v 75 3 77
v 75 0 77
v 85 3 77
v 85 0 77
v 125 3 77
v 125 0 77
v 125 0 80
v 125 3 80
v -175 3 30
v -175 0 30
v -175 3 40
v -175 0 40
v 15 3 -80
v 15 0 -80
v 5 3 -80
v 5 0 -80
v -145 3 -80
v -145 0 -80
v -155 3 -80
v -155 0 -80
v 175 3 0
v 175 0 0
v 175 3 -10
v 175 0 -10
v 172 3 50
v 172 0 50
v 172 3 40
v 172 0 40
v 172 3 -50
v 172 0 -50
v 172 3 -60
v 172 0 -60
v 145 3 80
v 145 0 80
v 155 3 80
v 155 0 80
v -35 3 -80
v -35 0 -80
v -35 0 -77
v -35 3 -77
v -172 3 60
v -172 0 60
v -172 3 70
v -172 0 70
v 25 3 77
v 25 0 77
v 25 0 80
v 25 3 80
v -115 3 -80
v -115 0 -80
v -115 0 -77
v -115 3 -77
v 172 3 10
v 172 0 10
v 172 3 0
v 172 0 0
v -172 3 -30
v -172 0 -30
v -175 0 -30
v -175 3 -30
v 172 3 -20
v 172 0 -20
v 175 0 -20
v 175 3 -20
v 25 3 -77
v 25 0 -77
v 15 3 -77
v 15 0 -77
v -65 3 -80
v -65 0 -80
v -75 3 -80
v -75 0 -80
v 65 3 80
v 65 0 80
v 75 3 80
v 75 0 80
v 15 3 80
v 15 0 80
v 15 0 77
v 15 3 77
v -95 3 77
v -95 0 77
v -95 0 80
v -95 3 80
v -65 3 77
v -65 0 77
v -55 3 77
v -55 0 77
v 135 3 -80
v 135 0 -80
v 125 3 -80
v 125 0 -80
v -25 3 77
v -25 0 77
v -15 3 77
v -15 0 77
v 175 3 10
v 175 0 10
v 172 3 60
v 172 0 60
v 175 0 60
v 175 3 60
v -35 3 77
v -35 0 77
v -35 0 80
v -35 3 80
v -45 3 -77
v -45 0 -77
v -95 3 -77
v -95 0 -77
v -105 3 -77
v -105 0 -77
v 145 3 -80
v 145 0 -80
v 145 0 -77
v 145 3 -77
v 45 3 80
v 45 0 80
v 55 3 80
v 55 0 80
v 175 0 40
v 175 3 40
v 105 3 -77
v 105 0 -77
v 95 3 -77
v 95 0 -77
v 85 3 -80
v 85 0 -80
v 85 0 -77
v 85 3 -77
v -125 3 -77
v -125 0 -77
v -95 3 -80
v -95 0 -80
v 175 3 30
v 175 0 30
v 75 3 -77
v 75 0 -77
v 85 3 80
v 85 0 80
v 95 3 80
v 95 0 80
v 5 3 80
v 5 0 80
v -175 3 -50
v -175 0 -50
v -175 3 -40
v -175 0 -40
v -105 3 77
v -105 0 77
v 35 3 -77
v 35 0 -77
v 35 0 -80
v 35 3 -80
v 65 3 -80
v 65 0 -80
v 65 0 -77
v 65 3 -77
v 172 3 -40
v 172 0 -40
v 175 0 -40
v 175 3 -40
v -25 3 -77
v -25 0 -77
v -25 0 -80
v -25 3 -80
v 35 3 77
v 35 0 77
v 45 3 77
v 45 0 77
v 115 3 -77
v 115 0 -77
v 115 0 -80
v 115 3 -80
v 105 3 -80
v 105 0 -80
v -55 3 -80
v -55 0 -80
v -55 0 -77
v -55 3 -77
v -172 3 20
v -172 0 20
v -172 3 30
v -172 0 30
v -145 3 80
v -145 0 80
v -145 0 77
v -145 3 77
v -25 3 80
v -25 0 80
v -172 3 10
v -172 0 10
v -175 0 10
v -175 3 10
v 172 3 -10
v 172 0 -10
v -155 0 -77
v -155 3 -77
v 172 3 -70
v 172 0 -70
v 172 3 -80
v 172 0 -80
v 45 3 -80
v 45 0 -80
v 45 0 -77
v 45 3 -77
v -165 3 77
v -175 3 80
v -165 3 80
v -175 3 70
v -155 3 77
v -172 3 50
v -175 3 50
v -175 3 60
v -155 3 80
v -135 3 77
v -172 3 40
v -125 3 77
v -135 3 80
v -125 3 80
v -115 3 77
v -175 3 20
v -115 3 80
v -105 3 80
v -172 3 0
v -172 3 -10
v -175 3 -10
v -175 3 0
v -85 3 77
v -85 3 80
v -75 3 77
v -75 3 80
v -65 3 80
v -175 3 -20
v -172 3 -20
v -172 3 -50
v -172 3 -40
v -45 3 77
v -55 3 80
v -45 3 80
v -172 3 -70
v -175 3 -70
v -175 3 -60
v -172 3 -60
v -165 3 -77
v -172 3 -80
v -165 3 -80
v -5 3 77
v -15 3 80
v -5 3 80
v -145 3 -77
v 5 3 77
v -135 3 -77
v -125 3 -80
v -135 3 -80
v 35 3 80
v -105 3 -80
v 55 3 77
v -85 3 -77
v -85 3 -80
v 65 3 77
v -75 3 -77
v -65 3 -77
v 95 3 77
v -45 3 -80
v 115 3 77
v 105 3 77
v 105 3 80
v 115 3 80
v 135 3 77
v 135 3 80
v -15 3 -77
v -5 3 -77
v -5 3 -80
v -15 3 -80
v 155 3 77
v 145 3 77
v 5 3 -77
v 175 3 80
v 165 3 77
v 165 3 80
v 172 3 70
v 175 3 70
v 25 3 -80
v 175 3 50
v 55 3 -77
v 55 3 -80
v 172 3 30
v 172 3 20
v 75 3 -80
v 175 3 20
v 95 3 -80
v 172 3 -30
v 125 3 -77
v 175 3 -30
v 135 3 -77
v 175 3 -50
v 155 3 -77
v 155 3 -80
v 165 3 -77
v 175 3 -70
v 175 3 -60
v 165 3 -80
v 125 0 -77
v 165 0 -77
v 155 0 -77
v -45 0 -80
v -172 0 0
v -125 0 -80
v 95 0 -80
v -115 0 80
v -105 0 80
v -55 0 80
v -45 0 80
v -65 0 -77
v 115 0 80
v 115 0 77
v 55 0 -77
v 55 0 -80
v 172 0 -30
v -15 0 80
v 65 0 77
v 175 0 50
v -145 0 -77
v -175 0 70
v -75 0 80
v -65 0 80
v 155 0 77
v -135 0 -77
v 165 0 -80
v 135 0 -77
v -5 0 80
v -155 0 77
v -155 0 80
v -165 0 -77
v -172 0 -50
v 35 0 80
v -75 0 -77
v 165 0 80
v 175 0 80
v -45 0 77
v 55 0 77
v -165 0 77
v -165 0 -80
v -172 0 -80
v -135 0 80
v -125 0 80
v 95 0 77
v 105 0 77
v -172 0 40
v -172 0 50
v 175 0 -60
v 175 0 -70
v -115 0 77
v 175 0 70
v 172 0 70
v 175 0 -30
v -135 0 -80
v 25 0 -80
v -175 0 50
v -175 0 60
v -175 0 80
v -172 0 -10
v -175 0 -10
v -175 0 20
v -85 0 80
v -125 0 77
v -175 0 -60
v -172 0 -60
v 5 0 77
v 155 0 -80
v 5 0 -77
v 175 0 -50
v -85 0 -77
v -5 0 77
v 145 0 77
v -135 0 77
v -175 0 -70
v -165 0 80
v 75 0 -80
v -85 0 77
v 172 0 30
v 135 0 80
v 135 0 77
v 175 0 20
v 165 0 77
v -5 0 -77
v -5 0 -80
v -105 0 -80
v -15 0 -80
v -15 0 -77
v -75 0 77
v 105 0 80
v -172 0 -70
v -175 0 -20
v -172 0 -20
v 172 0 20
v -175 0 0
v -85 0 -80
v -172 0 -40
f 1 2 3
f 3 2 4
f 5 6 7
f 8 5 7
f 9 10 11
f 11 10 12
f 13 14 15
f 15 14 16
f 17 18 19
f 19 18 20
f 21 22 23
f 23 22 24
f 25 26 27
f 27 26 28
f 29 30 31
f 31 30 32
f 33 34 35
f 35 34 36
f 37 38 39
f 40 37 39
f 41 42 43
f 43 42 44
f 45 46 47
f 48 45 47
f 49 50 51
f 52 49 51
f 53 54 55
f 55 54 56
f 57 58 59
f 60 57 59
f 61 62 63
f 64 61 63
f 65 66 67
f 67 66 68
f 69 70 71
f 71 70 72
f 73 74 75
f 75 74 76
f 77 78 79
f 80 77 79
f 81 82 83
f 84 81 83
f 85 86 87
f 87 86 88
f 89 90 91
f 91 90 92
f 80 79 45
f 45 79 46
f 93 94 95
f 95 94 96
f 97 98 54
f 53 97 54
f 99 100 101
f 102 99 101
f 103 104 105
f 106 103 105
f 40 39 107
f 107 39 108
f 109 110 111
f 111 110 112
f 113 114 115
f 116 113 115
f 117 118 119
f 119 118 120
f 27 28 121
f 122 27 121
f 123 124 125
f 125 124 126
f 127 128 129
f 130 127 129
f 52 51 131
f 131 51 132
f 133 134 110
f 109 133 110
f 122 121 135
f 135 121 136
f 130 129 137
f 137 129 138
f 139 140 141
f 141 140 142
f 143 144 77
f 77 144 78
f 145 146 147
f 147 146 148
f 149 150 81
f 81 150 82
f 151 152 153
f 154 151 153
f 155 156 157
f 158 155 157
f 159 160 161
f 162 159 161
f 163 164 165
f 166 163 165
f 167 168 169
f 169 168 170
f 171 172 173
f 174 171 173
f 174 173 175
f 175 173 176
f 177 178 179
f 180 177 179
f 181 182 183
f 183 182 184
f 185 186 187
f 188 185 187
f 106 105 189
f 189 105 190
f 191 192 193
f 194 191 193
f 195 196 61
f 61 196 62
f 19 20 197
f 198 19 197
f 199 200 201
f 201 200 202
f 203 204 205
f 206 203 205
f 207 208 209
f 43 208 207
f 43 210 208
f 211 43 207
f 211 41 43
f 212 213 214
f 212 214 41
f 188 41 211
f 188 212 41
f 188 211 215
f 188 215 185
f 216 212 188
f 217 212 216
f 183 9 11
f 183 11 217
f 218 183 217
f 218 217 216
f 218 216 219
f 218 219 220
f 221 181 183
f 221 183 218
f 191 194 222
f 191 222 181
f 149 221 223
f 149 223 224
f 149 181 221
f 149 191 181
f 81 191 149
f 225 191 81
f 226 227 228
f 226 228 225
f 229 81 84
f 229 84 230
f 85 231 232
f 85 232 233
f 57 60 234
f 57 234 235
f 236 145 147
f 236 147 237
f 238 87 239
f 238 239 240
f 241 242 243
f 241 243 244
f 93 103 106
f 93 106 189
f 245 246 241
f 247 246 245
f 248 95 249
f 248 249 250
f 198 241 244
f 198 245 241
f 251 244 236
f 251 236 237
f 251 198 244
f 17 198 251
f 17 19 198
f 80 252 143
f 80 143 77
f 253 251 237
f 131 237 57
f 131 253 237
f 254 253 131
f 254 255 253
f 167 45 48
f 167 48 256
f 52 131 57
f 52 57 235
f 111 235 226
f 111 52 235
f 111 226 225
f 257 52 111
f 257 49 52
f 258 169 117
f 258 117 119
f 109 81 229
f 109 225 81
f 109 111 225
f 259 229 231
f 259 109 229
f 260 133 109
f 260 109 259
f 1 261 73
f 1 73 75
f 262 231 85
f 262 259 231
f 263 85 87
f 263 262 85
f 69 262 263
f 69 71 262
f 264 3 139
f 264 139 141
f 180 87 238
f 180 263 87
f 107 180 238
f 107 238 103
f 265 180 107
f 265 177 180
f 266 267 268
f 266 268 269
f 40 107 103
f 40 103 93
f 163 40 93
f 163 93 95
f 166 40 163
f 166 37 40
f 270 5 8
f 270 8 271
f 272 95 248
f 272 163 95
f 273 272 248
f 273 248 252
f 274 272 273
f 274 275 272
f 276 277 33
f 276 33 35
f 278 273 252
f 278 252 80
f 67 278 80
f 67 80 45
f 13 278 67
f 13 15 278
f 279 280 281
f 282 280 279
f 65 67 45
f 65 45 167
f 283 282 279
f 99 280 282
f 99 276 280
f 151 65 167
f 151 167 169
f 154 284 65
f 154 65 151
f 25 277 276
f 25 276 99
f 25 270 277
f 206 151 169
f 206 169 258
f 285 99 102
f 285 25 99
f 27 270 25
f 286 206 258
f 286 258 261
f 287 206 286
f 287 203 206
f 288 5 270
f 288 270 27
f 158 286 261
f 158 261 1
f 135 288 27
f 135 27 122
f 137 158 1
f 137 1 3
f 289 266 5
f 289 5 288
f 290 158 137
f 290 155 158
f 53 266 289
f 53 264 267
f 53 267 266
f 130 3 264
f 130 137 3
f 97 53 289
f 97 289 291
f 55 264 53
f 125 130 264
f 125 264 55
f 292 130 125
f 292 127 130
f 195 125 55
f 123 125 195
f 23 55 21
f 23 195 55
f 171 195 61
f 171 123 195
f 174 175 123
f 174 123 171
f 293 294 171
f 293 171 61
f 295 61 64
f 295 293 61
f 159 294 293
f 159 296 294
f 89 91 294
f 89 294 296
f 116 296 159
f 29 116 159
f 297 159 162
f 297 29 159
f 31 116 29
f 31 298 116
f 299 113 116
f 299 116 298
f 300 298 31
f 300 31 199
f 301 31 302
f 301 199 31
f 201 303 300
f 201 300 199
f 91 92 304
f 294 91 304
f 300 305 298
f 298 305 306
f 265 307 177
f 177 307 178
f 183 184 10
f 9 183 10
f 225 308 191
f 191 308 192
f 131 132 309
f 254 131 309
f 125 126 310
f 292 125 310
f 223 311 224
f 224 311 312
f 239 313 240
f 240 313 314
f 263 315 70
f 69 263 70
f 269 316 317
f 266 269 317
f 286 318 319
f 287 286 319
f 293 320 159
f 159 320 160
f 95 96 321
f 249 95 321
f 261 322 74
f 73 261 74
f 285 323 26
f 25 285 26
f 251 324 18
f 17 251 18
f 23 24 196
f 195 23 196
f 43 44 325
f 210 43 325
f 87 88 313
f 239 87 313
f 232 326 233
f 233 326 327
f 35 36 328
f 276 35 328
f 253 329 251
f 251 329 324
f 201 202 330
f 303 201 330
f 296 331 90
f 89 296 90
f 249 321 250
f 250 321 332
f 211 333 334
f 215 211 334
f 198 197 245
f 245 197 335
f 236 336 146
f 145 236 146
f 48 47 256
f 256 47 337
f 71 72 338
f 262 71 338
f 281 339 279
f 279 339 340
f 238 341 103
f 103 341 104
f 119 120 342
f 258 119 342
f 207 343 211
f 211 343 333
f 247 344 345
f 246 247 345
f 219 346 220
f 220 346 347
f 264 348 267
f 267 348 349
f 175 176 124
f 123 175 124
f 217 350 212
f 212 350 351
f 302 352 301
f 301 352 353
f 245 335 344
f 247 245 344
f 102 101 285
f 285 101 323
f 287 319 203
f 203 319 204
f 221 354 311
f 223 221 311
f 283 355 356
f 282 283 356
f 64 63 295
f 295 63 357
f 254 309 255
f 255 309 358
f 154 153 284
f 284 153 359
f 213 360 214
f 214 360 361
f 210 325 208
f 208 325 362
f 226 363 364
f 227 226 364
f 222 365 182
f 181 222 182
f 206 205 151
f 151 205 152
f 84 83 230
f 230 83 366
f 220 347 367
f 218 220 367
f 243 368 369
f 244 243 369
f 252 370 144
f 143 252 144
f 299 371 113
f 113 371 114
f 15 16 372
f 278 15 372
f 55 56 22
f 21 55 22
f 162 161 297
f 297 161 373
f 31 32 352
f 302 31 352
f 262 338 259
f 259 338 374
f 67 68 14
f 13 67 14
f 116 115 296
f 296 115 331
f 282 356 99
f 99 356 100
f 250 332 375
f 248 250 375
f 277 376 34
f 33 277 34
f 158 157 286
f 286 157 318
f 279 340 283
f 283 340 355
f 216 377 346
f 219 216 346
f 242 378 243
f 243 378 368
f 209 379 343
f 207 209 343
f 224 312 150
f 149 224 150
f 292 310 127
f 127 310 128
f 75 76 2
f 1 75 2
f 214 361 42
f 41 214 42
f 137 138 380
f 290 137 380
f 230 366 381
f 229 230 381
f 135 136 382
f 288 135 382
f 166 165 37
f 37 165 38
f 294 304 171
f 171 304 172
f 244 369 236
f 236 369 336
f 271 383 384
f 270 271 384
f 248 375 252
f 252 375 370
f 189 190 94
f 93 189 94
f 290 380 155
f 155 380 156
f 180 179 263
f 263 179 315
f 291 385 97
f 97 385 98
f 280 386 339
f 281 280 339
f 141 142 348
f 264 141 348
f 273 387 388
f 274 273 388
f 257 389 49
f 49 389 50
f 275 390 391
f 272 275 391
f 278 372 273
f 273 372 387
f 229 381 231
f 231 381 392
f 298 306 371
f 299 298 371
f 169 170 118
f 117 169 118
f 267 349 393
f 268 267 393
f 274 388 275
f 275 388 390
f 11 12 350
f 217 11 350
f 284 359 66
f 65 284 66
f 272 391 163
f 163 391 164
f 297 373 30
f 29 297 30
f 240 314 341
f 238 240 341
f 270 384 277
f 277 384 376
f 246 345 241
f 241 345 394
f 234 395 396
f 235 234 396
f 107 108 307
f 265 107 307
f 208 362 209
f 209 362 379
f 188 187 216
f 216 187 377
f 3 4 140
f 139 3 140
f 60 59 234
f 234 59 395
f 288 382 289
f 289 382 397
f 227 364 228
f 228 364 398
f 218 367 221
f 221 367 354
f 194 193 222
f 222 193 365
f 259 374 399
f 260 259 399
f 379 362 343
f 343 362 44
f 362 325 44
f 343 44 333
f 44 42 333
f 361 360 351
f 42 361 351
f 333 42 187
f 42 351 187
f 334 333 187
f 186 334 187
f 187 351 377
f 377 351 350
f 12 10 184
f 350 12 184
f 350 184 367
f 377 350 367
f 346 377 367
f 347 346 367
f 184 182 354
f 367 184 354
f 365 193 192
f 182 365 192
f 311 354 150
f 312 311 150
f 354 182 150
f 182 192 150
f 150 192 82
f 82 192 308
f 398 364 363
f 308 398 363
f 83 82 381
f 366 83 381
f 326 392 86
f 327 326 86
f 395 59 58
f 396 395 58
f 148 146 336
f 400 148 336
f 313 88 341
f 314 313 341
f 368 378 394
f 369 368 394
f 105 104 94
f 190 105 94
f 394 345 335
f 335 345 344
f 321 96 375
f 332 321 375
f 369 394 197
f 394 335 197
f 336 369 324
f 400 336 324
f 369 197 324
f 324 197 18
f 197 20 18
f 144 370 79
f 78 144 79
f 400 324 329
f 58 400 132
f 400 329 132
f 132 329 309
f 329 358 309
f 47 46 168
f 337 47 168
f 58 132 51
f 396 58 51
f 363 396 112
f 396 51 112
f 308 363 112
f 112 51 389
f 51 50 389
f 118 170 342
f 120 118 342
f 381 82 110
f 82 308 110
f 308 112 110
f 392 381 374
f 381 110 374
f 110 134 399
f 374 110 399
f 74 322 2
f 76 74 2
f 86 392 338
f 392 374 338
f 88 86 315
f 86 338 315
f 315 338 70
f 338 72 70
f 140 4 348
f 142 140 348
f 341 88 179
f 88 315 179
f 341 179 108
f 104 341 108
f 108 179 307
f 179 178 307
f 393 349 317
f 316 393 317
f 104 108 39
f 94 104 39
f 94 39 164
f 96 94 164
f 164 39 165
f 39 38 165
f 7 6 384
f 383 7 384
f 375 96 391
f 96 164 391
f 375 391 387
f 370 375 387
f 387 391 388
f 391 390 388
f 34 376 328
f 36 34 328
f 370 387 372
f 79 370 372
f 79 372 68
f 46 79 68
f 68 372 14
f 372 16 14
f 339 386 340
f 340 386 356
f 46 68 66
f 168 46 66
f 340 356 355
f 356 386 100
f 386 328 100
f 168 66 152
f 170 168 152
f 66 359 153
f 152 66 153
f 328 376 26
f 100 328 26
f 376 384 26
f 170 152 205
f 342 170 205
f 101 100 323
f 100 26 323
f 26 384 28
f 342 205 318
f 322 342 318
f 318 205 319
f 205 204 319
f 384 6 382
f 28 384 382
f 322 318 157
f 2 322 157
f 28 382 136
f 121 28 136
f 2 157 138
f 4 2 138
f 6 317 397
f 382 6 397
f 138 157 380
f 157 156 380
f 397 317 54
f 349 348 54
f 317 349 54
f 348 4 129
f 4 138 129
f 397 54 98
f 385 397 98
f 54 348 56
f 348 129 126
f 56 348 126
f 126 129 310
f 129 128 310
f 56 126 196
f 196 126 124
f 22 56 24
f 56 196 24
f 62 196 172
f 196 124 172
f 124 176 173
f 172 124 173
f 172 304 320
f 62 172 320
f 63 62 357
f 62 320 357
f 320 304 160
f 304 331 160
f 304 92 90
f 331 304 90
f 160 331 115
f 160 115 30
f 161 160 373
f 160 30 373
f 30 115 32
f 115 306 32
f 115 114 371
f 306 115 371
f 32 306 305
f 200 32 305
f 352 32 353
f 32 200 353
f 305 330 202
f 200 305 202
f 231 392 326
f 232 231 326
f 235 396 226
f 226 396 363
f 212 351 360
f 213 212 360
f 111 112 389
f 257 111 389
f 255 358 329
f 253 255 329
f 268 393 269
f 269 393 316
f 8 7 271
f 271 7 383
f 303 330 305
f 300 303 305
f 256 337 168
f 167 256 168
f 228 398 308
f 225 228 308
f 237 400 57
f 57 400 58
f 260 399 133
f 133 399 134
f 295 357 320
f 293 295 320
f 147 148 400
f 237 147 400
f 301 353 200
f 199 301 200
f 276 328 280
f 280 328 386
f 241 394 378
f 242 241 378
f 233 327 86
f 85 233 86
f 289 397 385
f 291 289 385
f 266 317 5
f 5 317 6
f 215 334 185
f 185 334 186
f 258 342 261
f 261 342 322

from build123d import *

# Parameters (mm, degrees)
SALIENTE_EXTRUIR1_DEPTH = 3


with BuildPart() as part:
    # Croquis1 → Saliente-Extruir1 (new body)
    with BuildSketch(Plane(origin=(0, 0, 0), x_dir=(1, 0, 0), z_dir=(0, 1, 0))):
        Polygon((165, -80), (175, -80), (175, -70), (172, -70), (172, -60), (175, -60), (175, -50), (172, -50), (172, -40), (175, -40), (175, -30), (172, -30), (172, -20), (175, -20), (175, -10), (172, -10), (172, 0), (175, 0), (175, 10), (172, 10), (172, 20), (175, 20), (175, 30), (172, 30), (172, 40), (175, 40), (175, 50), (172, 50), (172, 60), (175, 60), (175, 70), (172, 70), (172, 80), (165, 80), (165, 77), (155, 77), (155, 80), (145, 80), (145, 77), (135, 77), (135, 80), (125, 80), (125, 77), (115, 77), (115, 80), (105, 80), (105, 77), (95, 77), (95, 80), (85, 80), (85, 77), (75, 77), (75, 80), (65, 80), (65, 77), (55, 77), (55, 80), (45, 80), (45, 77), (35, 77), (35, 80), (25, 80), (25, 77), (15, 77), (15, 80), (5, 80), (5, 77), (-5, 77), (-5, 80), (-15, 80), (-15, 77), (-25, 77), (-25, 80), (-35, 80), (-35, 77), (-45, 77), (-45, 80), (-55, 80), (-55, 77), (-65, 77), (-65, 80), (-75, 80), (-75, 77), (-85, 77), (-85, 80), (-95, 80), (-95, 77), (-105, 77), (-105, 80), (-115, 80), (-115, 77), (-125, 77), (-125, 80), (-135, 80), (-135, 77), (-145, 77), (-145, 80), (-155, 80), (-155, 77), (-165, 77), (-165, 80), (-172, 80), (-172, 70), (-175, 70), (-175, 60), (-172, 60), (-172, 50), (-175, 50), (-175, 40), (-172, 40), (-172, 30), (-175, 30), (-175, 20), (-172, 20), (-172, 10), (-175, 10), (-175, 0), (-172, 0), (-172, -10), (-175, -10), (-175, -20), (-172, -20), (-172, -30), (-175, -30), (-175, -40), (-172, -40), (-172, -50), (-175, -50), (-175, -60), (-172, -60), (-172, -70), (-175, -70), (-175, -80), (-165, -80), (-165, -77), (-155, -77), (-155, -80), (-145, -80), (-145, -77), (-135, -77), (-135, -80), (-125, -80), (-125, -77), (-115, -77), (-115, -80), (-105, -80), (-105, -77), (-95, -77), (-95, -80), (-85, -80), (-85, -77), (-75, -77), (-75, -80), (-65, -80), (-65, -77), (-55, -77), (-55, -80), (-45, -80), (-45, -77), (-35, -77), (-35, -80), (-25, -80), (-25, -77), (-15, -77), (-15, -80), (-5, -80), (-5, -77), (5, -77), (5, -80), (15, -80), (15, -77), (25, -77), (25, -80), (35, -80), (35, -77), (45, -77), (45, -80), (55, -80), (55, -77), (65, -77), (65, -80), (75, -80), (75, -77), (85, -77), (85, -80), (95, -80), (95, -77), (105, -77), (105, -80), (115, -80), (115, -77), (125, -77), (125, -80), (135, -80), (135, -77), (145, -77), (145, -80), (155, -80), (155, -77), (165, -77), align=None)
    extrude(amount=SALIENTE_EXTRUIR1_DEPTH)


solid = part.part
